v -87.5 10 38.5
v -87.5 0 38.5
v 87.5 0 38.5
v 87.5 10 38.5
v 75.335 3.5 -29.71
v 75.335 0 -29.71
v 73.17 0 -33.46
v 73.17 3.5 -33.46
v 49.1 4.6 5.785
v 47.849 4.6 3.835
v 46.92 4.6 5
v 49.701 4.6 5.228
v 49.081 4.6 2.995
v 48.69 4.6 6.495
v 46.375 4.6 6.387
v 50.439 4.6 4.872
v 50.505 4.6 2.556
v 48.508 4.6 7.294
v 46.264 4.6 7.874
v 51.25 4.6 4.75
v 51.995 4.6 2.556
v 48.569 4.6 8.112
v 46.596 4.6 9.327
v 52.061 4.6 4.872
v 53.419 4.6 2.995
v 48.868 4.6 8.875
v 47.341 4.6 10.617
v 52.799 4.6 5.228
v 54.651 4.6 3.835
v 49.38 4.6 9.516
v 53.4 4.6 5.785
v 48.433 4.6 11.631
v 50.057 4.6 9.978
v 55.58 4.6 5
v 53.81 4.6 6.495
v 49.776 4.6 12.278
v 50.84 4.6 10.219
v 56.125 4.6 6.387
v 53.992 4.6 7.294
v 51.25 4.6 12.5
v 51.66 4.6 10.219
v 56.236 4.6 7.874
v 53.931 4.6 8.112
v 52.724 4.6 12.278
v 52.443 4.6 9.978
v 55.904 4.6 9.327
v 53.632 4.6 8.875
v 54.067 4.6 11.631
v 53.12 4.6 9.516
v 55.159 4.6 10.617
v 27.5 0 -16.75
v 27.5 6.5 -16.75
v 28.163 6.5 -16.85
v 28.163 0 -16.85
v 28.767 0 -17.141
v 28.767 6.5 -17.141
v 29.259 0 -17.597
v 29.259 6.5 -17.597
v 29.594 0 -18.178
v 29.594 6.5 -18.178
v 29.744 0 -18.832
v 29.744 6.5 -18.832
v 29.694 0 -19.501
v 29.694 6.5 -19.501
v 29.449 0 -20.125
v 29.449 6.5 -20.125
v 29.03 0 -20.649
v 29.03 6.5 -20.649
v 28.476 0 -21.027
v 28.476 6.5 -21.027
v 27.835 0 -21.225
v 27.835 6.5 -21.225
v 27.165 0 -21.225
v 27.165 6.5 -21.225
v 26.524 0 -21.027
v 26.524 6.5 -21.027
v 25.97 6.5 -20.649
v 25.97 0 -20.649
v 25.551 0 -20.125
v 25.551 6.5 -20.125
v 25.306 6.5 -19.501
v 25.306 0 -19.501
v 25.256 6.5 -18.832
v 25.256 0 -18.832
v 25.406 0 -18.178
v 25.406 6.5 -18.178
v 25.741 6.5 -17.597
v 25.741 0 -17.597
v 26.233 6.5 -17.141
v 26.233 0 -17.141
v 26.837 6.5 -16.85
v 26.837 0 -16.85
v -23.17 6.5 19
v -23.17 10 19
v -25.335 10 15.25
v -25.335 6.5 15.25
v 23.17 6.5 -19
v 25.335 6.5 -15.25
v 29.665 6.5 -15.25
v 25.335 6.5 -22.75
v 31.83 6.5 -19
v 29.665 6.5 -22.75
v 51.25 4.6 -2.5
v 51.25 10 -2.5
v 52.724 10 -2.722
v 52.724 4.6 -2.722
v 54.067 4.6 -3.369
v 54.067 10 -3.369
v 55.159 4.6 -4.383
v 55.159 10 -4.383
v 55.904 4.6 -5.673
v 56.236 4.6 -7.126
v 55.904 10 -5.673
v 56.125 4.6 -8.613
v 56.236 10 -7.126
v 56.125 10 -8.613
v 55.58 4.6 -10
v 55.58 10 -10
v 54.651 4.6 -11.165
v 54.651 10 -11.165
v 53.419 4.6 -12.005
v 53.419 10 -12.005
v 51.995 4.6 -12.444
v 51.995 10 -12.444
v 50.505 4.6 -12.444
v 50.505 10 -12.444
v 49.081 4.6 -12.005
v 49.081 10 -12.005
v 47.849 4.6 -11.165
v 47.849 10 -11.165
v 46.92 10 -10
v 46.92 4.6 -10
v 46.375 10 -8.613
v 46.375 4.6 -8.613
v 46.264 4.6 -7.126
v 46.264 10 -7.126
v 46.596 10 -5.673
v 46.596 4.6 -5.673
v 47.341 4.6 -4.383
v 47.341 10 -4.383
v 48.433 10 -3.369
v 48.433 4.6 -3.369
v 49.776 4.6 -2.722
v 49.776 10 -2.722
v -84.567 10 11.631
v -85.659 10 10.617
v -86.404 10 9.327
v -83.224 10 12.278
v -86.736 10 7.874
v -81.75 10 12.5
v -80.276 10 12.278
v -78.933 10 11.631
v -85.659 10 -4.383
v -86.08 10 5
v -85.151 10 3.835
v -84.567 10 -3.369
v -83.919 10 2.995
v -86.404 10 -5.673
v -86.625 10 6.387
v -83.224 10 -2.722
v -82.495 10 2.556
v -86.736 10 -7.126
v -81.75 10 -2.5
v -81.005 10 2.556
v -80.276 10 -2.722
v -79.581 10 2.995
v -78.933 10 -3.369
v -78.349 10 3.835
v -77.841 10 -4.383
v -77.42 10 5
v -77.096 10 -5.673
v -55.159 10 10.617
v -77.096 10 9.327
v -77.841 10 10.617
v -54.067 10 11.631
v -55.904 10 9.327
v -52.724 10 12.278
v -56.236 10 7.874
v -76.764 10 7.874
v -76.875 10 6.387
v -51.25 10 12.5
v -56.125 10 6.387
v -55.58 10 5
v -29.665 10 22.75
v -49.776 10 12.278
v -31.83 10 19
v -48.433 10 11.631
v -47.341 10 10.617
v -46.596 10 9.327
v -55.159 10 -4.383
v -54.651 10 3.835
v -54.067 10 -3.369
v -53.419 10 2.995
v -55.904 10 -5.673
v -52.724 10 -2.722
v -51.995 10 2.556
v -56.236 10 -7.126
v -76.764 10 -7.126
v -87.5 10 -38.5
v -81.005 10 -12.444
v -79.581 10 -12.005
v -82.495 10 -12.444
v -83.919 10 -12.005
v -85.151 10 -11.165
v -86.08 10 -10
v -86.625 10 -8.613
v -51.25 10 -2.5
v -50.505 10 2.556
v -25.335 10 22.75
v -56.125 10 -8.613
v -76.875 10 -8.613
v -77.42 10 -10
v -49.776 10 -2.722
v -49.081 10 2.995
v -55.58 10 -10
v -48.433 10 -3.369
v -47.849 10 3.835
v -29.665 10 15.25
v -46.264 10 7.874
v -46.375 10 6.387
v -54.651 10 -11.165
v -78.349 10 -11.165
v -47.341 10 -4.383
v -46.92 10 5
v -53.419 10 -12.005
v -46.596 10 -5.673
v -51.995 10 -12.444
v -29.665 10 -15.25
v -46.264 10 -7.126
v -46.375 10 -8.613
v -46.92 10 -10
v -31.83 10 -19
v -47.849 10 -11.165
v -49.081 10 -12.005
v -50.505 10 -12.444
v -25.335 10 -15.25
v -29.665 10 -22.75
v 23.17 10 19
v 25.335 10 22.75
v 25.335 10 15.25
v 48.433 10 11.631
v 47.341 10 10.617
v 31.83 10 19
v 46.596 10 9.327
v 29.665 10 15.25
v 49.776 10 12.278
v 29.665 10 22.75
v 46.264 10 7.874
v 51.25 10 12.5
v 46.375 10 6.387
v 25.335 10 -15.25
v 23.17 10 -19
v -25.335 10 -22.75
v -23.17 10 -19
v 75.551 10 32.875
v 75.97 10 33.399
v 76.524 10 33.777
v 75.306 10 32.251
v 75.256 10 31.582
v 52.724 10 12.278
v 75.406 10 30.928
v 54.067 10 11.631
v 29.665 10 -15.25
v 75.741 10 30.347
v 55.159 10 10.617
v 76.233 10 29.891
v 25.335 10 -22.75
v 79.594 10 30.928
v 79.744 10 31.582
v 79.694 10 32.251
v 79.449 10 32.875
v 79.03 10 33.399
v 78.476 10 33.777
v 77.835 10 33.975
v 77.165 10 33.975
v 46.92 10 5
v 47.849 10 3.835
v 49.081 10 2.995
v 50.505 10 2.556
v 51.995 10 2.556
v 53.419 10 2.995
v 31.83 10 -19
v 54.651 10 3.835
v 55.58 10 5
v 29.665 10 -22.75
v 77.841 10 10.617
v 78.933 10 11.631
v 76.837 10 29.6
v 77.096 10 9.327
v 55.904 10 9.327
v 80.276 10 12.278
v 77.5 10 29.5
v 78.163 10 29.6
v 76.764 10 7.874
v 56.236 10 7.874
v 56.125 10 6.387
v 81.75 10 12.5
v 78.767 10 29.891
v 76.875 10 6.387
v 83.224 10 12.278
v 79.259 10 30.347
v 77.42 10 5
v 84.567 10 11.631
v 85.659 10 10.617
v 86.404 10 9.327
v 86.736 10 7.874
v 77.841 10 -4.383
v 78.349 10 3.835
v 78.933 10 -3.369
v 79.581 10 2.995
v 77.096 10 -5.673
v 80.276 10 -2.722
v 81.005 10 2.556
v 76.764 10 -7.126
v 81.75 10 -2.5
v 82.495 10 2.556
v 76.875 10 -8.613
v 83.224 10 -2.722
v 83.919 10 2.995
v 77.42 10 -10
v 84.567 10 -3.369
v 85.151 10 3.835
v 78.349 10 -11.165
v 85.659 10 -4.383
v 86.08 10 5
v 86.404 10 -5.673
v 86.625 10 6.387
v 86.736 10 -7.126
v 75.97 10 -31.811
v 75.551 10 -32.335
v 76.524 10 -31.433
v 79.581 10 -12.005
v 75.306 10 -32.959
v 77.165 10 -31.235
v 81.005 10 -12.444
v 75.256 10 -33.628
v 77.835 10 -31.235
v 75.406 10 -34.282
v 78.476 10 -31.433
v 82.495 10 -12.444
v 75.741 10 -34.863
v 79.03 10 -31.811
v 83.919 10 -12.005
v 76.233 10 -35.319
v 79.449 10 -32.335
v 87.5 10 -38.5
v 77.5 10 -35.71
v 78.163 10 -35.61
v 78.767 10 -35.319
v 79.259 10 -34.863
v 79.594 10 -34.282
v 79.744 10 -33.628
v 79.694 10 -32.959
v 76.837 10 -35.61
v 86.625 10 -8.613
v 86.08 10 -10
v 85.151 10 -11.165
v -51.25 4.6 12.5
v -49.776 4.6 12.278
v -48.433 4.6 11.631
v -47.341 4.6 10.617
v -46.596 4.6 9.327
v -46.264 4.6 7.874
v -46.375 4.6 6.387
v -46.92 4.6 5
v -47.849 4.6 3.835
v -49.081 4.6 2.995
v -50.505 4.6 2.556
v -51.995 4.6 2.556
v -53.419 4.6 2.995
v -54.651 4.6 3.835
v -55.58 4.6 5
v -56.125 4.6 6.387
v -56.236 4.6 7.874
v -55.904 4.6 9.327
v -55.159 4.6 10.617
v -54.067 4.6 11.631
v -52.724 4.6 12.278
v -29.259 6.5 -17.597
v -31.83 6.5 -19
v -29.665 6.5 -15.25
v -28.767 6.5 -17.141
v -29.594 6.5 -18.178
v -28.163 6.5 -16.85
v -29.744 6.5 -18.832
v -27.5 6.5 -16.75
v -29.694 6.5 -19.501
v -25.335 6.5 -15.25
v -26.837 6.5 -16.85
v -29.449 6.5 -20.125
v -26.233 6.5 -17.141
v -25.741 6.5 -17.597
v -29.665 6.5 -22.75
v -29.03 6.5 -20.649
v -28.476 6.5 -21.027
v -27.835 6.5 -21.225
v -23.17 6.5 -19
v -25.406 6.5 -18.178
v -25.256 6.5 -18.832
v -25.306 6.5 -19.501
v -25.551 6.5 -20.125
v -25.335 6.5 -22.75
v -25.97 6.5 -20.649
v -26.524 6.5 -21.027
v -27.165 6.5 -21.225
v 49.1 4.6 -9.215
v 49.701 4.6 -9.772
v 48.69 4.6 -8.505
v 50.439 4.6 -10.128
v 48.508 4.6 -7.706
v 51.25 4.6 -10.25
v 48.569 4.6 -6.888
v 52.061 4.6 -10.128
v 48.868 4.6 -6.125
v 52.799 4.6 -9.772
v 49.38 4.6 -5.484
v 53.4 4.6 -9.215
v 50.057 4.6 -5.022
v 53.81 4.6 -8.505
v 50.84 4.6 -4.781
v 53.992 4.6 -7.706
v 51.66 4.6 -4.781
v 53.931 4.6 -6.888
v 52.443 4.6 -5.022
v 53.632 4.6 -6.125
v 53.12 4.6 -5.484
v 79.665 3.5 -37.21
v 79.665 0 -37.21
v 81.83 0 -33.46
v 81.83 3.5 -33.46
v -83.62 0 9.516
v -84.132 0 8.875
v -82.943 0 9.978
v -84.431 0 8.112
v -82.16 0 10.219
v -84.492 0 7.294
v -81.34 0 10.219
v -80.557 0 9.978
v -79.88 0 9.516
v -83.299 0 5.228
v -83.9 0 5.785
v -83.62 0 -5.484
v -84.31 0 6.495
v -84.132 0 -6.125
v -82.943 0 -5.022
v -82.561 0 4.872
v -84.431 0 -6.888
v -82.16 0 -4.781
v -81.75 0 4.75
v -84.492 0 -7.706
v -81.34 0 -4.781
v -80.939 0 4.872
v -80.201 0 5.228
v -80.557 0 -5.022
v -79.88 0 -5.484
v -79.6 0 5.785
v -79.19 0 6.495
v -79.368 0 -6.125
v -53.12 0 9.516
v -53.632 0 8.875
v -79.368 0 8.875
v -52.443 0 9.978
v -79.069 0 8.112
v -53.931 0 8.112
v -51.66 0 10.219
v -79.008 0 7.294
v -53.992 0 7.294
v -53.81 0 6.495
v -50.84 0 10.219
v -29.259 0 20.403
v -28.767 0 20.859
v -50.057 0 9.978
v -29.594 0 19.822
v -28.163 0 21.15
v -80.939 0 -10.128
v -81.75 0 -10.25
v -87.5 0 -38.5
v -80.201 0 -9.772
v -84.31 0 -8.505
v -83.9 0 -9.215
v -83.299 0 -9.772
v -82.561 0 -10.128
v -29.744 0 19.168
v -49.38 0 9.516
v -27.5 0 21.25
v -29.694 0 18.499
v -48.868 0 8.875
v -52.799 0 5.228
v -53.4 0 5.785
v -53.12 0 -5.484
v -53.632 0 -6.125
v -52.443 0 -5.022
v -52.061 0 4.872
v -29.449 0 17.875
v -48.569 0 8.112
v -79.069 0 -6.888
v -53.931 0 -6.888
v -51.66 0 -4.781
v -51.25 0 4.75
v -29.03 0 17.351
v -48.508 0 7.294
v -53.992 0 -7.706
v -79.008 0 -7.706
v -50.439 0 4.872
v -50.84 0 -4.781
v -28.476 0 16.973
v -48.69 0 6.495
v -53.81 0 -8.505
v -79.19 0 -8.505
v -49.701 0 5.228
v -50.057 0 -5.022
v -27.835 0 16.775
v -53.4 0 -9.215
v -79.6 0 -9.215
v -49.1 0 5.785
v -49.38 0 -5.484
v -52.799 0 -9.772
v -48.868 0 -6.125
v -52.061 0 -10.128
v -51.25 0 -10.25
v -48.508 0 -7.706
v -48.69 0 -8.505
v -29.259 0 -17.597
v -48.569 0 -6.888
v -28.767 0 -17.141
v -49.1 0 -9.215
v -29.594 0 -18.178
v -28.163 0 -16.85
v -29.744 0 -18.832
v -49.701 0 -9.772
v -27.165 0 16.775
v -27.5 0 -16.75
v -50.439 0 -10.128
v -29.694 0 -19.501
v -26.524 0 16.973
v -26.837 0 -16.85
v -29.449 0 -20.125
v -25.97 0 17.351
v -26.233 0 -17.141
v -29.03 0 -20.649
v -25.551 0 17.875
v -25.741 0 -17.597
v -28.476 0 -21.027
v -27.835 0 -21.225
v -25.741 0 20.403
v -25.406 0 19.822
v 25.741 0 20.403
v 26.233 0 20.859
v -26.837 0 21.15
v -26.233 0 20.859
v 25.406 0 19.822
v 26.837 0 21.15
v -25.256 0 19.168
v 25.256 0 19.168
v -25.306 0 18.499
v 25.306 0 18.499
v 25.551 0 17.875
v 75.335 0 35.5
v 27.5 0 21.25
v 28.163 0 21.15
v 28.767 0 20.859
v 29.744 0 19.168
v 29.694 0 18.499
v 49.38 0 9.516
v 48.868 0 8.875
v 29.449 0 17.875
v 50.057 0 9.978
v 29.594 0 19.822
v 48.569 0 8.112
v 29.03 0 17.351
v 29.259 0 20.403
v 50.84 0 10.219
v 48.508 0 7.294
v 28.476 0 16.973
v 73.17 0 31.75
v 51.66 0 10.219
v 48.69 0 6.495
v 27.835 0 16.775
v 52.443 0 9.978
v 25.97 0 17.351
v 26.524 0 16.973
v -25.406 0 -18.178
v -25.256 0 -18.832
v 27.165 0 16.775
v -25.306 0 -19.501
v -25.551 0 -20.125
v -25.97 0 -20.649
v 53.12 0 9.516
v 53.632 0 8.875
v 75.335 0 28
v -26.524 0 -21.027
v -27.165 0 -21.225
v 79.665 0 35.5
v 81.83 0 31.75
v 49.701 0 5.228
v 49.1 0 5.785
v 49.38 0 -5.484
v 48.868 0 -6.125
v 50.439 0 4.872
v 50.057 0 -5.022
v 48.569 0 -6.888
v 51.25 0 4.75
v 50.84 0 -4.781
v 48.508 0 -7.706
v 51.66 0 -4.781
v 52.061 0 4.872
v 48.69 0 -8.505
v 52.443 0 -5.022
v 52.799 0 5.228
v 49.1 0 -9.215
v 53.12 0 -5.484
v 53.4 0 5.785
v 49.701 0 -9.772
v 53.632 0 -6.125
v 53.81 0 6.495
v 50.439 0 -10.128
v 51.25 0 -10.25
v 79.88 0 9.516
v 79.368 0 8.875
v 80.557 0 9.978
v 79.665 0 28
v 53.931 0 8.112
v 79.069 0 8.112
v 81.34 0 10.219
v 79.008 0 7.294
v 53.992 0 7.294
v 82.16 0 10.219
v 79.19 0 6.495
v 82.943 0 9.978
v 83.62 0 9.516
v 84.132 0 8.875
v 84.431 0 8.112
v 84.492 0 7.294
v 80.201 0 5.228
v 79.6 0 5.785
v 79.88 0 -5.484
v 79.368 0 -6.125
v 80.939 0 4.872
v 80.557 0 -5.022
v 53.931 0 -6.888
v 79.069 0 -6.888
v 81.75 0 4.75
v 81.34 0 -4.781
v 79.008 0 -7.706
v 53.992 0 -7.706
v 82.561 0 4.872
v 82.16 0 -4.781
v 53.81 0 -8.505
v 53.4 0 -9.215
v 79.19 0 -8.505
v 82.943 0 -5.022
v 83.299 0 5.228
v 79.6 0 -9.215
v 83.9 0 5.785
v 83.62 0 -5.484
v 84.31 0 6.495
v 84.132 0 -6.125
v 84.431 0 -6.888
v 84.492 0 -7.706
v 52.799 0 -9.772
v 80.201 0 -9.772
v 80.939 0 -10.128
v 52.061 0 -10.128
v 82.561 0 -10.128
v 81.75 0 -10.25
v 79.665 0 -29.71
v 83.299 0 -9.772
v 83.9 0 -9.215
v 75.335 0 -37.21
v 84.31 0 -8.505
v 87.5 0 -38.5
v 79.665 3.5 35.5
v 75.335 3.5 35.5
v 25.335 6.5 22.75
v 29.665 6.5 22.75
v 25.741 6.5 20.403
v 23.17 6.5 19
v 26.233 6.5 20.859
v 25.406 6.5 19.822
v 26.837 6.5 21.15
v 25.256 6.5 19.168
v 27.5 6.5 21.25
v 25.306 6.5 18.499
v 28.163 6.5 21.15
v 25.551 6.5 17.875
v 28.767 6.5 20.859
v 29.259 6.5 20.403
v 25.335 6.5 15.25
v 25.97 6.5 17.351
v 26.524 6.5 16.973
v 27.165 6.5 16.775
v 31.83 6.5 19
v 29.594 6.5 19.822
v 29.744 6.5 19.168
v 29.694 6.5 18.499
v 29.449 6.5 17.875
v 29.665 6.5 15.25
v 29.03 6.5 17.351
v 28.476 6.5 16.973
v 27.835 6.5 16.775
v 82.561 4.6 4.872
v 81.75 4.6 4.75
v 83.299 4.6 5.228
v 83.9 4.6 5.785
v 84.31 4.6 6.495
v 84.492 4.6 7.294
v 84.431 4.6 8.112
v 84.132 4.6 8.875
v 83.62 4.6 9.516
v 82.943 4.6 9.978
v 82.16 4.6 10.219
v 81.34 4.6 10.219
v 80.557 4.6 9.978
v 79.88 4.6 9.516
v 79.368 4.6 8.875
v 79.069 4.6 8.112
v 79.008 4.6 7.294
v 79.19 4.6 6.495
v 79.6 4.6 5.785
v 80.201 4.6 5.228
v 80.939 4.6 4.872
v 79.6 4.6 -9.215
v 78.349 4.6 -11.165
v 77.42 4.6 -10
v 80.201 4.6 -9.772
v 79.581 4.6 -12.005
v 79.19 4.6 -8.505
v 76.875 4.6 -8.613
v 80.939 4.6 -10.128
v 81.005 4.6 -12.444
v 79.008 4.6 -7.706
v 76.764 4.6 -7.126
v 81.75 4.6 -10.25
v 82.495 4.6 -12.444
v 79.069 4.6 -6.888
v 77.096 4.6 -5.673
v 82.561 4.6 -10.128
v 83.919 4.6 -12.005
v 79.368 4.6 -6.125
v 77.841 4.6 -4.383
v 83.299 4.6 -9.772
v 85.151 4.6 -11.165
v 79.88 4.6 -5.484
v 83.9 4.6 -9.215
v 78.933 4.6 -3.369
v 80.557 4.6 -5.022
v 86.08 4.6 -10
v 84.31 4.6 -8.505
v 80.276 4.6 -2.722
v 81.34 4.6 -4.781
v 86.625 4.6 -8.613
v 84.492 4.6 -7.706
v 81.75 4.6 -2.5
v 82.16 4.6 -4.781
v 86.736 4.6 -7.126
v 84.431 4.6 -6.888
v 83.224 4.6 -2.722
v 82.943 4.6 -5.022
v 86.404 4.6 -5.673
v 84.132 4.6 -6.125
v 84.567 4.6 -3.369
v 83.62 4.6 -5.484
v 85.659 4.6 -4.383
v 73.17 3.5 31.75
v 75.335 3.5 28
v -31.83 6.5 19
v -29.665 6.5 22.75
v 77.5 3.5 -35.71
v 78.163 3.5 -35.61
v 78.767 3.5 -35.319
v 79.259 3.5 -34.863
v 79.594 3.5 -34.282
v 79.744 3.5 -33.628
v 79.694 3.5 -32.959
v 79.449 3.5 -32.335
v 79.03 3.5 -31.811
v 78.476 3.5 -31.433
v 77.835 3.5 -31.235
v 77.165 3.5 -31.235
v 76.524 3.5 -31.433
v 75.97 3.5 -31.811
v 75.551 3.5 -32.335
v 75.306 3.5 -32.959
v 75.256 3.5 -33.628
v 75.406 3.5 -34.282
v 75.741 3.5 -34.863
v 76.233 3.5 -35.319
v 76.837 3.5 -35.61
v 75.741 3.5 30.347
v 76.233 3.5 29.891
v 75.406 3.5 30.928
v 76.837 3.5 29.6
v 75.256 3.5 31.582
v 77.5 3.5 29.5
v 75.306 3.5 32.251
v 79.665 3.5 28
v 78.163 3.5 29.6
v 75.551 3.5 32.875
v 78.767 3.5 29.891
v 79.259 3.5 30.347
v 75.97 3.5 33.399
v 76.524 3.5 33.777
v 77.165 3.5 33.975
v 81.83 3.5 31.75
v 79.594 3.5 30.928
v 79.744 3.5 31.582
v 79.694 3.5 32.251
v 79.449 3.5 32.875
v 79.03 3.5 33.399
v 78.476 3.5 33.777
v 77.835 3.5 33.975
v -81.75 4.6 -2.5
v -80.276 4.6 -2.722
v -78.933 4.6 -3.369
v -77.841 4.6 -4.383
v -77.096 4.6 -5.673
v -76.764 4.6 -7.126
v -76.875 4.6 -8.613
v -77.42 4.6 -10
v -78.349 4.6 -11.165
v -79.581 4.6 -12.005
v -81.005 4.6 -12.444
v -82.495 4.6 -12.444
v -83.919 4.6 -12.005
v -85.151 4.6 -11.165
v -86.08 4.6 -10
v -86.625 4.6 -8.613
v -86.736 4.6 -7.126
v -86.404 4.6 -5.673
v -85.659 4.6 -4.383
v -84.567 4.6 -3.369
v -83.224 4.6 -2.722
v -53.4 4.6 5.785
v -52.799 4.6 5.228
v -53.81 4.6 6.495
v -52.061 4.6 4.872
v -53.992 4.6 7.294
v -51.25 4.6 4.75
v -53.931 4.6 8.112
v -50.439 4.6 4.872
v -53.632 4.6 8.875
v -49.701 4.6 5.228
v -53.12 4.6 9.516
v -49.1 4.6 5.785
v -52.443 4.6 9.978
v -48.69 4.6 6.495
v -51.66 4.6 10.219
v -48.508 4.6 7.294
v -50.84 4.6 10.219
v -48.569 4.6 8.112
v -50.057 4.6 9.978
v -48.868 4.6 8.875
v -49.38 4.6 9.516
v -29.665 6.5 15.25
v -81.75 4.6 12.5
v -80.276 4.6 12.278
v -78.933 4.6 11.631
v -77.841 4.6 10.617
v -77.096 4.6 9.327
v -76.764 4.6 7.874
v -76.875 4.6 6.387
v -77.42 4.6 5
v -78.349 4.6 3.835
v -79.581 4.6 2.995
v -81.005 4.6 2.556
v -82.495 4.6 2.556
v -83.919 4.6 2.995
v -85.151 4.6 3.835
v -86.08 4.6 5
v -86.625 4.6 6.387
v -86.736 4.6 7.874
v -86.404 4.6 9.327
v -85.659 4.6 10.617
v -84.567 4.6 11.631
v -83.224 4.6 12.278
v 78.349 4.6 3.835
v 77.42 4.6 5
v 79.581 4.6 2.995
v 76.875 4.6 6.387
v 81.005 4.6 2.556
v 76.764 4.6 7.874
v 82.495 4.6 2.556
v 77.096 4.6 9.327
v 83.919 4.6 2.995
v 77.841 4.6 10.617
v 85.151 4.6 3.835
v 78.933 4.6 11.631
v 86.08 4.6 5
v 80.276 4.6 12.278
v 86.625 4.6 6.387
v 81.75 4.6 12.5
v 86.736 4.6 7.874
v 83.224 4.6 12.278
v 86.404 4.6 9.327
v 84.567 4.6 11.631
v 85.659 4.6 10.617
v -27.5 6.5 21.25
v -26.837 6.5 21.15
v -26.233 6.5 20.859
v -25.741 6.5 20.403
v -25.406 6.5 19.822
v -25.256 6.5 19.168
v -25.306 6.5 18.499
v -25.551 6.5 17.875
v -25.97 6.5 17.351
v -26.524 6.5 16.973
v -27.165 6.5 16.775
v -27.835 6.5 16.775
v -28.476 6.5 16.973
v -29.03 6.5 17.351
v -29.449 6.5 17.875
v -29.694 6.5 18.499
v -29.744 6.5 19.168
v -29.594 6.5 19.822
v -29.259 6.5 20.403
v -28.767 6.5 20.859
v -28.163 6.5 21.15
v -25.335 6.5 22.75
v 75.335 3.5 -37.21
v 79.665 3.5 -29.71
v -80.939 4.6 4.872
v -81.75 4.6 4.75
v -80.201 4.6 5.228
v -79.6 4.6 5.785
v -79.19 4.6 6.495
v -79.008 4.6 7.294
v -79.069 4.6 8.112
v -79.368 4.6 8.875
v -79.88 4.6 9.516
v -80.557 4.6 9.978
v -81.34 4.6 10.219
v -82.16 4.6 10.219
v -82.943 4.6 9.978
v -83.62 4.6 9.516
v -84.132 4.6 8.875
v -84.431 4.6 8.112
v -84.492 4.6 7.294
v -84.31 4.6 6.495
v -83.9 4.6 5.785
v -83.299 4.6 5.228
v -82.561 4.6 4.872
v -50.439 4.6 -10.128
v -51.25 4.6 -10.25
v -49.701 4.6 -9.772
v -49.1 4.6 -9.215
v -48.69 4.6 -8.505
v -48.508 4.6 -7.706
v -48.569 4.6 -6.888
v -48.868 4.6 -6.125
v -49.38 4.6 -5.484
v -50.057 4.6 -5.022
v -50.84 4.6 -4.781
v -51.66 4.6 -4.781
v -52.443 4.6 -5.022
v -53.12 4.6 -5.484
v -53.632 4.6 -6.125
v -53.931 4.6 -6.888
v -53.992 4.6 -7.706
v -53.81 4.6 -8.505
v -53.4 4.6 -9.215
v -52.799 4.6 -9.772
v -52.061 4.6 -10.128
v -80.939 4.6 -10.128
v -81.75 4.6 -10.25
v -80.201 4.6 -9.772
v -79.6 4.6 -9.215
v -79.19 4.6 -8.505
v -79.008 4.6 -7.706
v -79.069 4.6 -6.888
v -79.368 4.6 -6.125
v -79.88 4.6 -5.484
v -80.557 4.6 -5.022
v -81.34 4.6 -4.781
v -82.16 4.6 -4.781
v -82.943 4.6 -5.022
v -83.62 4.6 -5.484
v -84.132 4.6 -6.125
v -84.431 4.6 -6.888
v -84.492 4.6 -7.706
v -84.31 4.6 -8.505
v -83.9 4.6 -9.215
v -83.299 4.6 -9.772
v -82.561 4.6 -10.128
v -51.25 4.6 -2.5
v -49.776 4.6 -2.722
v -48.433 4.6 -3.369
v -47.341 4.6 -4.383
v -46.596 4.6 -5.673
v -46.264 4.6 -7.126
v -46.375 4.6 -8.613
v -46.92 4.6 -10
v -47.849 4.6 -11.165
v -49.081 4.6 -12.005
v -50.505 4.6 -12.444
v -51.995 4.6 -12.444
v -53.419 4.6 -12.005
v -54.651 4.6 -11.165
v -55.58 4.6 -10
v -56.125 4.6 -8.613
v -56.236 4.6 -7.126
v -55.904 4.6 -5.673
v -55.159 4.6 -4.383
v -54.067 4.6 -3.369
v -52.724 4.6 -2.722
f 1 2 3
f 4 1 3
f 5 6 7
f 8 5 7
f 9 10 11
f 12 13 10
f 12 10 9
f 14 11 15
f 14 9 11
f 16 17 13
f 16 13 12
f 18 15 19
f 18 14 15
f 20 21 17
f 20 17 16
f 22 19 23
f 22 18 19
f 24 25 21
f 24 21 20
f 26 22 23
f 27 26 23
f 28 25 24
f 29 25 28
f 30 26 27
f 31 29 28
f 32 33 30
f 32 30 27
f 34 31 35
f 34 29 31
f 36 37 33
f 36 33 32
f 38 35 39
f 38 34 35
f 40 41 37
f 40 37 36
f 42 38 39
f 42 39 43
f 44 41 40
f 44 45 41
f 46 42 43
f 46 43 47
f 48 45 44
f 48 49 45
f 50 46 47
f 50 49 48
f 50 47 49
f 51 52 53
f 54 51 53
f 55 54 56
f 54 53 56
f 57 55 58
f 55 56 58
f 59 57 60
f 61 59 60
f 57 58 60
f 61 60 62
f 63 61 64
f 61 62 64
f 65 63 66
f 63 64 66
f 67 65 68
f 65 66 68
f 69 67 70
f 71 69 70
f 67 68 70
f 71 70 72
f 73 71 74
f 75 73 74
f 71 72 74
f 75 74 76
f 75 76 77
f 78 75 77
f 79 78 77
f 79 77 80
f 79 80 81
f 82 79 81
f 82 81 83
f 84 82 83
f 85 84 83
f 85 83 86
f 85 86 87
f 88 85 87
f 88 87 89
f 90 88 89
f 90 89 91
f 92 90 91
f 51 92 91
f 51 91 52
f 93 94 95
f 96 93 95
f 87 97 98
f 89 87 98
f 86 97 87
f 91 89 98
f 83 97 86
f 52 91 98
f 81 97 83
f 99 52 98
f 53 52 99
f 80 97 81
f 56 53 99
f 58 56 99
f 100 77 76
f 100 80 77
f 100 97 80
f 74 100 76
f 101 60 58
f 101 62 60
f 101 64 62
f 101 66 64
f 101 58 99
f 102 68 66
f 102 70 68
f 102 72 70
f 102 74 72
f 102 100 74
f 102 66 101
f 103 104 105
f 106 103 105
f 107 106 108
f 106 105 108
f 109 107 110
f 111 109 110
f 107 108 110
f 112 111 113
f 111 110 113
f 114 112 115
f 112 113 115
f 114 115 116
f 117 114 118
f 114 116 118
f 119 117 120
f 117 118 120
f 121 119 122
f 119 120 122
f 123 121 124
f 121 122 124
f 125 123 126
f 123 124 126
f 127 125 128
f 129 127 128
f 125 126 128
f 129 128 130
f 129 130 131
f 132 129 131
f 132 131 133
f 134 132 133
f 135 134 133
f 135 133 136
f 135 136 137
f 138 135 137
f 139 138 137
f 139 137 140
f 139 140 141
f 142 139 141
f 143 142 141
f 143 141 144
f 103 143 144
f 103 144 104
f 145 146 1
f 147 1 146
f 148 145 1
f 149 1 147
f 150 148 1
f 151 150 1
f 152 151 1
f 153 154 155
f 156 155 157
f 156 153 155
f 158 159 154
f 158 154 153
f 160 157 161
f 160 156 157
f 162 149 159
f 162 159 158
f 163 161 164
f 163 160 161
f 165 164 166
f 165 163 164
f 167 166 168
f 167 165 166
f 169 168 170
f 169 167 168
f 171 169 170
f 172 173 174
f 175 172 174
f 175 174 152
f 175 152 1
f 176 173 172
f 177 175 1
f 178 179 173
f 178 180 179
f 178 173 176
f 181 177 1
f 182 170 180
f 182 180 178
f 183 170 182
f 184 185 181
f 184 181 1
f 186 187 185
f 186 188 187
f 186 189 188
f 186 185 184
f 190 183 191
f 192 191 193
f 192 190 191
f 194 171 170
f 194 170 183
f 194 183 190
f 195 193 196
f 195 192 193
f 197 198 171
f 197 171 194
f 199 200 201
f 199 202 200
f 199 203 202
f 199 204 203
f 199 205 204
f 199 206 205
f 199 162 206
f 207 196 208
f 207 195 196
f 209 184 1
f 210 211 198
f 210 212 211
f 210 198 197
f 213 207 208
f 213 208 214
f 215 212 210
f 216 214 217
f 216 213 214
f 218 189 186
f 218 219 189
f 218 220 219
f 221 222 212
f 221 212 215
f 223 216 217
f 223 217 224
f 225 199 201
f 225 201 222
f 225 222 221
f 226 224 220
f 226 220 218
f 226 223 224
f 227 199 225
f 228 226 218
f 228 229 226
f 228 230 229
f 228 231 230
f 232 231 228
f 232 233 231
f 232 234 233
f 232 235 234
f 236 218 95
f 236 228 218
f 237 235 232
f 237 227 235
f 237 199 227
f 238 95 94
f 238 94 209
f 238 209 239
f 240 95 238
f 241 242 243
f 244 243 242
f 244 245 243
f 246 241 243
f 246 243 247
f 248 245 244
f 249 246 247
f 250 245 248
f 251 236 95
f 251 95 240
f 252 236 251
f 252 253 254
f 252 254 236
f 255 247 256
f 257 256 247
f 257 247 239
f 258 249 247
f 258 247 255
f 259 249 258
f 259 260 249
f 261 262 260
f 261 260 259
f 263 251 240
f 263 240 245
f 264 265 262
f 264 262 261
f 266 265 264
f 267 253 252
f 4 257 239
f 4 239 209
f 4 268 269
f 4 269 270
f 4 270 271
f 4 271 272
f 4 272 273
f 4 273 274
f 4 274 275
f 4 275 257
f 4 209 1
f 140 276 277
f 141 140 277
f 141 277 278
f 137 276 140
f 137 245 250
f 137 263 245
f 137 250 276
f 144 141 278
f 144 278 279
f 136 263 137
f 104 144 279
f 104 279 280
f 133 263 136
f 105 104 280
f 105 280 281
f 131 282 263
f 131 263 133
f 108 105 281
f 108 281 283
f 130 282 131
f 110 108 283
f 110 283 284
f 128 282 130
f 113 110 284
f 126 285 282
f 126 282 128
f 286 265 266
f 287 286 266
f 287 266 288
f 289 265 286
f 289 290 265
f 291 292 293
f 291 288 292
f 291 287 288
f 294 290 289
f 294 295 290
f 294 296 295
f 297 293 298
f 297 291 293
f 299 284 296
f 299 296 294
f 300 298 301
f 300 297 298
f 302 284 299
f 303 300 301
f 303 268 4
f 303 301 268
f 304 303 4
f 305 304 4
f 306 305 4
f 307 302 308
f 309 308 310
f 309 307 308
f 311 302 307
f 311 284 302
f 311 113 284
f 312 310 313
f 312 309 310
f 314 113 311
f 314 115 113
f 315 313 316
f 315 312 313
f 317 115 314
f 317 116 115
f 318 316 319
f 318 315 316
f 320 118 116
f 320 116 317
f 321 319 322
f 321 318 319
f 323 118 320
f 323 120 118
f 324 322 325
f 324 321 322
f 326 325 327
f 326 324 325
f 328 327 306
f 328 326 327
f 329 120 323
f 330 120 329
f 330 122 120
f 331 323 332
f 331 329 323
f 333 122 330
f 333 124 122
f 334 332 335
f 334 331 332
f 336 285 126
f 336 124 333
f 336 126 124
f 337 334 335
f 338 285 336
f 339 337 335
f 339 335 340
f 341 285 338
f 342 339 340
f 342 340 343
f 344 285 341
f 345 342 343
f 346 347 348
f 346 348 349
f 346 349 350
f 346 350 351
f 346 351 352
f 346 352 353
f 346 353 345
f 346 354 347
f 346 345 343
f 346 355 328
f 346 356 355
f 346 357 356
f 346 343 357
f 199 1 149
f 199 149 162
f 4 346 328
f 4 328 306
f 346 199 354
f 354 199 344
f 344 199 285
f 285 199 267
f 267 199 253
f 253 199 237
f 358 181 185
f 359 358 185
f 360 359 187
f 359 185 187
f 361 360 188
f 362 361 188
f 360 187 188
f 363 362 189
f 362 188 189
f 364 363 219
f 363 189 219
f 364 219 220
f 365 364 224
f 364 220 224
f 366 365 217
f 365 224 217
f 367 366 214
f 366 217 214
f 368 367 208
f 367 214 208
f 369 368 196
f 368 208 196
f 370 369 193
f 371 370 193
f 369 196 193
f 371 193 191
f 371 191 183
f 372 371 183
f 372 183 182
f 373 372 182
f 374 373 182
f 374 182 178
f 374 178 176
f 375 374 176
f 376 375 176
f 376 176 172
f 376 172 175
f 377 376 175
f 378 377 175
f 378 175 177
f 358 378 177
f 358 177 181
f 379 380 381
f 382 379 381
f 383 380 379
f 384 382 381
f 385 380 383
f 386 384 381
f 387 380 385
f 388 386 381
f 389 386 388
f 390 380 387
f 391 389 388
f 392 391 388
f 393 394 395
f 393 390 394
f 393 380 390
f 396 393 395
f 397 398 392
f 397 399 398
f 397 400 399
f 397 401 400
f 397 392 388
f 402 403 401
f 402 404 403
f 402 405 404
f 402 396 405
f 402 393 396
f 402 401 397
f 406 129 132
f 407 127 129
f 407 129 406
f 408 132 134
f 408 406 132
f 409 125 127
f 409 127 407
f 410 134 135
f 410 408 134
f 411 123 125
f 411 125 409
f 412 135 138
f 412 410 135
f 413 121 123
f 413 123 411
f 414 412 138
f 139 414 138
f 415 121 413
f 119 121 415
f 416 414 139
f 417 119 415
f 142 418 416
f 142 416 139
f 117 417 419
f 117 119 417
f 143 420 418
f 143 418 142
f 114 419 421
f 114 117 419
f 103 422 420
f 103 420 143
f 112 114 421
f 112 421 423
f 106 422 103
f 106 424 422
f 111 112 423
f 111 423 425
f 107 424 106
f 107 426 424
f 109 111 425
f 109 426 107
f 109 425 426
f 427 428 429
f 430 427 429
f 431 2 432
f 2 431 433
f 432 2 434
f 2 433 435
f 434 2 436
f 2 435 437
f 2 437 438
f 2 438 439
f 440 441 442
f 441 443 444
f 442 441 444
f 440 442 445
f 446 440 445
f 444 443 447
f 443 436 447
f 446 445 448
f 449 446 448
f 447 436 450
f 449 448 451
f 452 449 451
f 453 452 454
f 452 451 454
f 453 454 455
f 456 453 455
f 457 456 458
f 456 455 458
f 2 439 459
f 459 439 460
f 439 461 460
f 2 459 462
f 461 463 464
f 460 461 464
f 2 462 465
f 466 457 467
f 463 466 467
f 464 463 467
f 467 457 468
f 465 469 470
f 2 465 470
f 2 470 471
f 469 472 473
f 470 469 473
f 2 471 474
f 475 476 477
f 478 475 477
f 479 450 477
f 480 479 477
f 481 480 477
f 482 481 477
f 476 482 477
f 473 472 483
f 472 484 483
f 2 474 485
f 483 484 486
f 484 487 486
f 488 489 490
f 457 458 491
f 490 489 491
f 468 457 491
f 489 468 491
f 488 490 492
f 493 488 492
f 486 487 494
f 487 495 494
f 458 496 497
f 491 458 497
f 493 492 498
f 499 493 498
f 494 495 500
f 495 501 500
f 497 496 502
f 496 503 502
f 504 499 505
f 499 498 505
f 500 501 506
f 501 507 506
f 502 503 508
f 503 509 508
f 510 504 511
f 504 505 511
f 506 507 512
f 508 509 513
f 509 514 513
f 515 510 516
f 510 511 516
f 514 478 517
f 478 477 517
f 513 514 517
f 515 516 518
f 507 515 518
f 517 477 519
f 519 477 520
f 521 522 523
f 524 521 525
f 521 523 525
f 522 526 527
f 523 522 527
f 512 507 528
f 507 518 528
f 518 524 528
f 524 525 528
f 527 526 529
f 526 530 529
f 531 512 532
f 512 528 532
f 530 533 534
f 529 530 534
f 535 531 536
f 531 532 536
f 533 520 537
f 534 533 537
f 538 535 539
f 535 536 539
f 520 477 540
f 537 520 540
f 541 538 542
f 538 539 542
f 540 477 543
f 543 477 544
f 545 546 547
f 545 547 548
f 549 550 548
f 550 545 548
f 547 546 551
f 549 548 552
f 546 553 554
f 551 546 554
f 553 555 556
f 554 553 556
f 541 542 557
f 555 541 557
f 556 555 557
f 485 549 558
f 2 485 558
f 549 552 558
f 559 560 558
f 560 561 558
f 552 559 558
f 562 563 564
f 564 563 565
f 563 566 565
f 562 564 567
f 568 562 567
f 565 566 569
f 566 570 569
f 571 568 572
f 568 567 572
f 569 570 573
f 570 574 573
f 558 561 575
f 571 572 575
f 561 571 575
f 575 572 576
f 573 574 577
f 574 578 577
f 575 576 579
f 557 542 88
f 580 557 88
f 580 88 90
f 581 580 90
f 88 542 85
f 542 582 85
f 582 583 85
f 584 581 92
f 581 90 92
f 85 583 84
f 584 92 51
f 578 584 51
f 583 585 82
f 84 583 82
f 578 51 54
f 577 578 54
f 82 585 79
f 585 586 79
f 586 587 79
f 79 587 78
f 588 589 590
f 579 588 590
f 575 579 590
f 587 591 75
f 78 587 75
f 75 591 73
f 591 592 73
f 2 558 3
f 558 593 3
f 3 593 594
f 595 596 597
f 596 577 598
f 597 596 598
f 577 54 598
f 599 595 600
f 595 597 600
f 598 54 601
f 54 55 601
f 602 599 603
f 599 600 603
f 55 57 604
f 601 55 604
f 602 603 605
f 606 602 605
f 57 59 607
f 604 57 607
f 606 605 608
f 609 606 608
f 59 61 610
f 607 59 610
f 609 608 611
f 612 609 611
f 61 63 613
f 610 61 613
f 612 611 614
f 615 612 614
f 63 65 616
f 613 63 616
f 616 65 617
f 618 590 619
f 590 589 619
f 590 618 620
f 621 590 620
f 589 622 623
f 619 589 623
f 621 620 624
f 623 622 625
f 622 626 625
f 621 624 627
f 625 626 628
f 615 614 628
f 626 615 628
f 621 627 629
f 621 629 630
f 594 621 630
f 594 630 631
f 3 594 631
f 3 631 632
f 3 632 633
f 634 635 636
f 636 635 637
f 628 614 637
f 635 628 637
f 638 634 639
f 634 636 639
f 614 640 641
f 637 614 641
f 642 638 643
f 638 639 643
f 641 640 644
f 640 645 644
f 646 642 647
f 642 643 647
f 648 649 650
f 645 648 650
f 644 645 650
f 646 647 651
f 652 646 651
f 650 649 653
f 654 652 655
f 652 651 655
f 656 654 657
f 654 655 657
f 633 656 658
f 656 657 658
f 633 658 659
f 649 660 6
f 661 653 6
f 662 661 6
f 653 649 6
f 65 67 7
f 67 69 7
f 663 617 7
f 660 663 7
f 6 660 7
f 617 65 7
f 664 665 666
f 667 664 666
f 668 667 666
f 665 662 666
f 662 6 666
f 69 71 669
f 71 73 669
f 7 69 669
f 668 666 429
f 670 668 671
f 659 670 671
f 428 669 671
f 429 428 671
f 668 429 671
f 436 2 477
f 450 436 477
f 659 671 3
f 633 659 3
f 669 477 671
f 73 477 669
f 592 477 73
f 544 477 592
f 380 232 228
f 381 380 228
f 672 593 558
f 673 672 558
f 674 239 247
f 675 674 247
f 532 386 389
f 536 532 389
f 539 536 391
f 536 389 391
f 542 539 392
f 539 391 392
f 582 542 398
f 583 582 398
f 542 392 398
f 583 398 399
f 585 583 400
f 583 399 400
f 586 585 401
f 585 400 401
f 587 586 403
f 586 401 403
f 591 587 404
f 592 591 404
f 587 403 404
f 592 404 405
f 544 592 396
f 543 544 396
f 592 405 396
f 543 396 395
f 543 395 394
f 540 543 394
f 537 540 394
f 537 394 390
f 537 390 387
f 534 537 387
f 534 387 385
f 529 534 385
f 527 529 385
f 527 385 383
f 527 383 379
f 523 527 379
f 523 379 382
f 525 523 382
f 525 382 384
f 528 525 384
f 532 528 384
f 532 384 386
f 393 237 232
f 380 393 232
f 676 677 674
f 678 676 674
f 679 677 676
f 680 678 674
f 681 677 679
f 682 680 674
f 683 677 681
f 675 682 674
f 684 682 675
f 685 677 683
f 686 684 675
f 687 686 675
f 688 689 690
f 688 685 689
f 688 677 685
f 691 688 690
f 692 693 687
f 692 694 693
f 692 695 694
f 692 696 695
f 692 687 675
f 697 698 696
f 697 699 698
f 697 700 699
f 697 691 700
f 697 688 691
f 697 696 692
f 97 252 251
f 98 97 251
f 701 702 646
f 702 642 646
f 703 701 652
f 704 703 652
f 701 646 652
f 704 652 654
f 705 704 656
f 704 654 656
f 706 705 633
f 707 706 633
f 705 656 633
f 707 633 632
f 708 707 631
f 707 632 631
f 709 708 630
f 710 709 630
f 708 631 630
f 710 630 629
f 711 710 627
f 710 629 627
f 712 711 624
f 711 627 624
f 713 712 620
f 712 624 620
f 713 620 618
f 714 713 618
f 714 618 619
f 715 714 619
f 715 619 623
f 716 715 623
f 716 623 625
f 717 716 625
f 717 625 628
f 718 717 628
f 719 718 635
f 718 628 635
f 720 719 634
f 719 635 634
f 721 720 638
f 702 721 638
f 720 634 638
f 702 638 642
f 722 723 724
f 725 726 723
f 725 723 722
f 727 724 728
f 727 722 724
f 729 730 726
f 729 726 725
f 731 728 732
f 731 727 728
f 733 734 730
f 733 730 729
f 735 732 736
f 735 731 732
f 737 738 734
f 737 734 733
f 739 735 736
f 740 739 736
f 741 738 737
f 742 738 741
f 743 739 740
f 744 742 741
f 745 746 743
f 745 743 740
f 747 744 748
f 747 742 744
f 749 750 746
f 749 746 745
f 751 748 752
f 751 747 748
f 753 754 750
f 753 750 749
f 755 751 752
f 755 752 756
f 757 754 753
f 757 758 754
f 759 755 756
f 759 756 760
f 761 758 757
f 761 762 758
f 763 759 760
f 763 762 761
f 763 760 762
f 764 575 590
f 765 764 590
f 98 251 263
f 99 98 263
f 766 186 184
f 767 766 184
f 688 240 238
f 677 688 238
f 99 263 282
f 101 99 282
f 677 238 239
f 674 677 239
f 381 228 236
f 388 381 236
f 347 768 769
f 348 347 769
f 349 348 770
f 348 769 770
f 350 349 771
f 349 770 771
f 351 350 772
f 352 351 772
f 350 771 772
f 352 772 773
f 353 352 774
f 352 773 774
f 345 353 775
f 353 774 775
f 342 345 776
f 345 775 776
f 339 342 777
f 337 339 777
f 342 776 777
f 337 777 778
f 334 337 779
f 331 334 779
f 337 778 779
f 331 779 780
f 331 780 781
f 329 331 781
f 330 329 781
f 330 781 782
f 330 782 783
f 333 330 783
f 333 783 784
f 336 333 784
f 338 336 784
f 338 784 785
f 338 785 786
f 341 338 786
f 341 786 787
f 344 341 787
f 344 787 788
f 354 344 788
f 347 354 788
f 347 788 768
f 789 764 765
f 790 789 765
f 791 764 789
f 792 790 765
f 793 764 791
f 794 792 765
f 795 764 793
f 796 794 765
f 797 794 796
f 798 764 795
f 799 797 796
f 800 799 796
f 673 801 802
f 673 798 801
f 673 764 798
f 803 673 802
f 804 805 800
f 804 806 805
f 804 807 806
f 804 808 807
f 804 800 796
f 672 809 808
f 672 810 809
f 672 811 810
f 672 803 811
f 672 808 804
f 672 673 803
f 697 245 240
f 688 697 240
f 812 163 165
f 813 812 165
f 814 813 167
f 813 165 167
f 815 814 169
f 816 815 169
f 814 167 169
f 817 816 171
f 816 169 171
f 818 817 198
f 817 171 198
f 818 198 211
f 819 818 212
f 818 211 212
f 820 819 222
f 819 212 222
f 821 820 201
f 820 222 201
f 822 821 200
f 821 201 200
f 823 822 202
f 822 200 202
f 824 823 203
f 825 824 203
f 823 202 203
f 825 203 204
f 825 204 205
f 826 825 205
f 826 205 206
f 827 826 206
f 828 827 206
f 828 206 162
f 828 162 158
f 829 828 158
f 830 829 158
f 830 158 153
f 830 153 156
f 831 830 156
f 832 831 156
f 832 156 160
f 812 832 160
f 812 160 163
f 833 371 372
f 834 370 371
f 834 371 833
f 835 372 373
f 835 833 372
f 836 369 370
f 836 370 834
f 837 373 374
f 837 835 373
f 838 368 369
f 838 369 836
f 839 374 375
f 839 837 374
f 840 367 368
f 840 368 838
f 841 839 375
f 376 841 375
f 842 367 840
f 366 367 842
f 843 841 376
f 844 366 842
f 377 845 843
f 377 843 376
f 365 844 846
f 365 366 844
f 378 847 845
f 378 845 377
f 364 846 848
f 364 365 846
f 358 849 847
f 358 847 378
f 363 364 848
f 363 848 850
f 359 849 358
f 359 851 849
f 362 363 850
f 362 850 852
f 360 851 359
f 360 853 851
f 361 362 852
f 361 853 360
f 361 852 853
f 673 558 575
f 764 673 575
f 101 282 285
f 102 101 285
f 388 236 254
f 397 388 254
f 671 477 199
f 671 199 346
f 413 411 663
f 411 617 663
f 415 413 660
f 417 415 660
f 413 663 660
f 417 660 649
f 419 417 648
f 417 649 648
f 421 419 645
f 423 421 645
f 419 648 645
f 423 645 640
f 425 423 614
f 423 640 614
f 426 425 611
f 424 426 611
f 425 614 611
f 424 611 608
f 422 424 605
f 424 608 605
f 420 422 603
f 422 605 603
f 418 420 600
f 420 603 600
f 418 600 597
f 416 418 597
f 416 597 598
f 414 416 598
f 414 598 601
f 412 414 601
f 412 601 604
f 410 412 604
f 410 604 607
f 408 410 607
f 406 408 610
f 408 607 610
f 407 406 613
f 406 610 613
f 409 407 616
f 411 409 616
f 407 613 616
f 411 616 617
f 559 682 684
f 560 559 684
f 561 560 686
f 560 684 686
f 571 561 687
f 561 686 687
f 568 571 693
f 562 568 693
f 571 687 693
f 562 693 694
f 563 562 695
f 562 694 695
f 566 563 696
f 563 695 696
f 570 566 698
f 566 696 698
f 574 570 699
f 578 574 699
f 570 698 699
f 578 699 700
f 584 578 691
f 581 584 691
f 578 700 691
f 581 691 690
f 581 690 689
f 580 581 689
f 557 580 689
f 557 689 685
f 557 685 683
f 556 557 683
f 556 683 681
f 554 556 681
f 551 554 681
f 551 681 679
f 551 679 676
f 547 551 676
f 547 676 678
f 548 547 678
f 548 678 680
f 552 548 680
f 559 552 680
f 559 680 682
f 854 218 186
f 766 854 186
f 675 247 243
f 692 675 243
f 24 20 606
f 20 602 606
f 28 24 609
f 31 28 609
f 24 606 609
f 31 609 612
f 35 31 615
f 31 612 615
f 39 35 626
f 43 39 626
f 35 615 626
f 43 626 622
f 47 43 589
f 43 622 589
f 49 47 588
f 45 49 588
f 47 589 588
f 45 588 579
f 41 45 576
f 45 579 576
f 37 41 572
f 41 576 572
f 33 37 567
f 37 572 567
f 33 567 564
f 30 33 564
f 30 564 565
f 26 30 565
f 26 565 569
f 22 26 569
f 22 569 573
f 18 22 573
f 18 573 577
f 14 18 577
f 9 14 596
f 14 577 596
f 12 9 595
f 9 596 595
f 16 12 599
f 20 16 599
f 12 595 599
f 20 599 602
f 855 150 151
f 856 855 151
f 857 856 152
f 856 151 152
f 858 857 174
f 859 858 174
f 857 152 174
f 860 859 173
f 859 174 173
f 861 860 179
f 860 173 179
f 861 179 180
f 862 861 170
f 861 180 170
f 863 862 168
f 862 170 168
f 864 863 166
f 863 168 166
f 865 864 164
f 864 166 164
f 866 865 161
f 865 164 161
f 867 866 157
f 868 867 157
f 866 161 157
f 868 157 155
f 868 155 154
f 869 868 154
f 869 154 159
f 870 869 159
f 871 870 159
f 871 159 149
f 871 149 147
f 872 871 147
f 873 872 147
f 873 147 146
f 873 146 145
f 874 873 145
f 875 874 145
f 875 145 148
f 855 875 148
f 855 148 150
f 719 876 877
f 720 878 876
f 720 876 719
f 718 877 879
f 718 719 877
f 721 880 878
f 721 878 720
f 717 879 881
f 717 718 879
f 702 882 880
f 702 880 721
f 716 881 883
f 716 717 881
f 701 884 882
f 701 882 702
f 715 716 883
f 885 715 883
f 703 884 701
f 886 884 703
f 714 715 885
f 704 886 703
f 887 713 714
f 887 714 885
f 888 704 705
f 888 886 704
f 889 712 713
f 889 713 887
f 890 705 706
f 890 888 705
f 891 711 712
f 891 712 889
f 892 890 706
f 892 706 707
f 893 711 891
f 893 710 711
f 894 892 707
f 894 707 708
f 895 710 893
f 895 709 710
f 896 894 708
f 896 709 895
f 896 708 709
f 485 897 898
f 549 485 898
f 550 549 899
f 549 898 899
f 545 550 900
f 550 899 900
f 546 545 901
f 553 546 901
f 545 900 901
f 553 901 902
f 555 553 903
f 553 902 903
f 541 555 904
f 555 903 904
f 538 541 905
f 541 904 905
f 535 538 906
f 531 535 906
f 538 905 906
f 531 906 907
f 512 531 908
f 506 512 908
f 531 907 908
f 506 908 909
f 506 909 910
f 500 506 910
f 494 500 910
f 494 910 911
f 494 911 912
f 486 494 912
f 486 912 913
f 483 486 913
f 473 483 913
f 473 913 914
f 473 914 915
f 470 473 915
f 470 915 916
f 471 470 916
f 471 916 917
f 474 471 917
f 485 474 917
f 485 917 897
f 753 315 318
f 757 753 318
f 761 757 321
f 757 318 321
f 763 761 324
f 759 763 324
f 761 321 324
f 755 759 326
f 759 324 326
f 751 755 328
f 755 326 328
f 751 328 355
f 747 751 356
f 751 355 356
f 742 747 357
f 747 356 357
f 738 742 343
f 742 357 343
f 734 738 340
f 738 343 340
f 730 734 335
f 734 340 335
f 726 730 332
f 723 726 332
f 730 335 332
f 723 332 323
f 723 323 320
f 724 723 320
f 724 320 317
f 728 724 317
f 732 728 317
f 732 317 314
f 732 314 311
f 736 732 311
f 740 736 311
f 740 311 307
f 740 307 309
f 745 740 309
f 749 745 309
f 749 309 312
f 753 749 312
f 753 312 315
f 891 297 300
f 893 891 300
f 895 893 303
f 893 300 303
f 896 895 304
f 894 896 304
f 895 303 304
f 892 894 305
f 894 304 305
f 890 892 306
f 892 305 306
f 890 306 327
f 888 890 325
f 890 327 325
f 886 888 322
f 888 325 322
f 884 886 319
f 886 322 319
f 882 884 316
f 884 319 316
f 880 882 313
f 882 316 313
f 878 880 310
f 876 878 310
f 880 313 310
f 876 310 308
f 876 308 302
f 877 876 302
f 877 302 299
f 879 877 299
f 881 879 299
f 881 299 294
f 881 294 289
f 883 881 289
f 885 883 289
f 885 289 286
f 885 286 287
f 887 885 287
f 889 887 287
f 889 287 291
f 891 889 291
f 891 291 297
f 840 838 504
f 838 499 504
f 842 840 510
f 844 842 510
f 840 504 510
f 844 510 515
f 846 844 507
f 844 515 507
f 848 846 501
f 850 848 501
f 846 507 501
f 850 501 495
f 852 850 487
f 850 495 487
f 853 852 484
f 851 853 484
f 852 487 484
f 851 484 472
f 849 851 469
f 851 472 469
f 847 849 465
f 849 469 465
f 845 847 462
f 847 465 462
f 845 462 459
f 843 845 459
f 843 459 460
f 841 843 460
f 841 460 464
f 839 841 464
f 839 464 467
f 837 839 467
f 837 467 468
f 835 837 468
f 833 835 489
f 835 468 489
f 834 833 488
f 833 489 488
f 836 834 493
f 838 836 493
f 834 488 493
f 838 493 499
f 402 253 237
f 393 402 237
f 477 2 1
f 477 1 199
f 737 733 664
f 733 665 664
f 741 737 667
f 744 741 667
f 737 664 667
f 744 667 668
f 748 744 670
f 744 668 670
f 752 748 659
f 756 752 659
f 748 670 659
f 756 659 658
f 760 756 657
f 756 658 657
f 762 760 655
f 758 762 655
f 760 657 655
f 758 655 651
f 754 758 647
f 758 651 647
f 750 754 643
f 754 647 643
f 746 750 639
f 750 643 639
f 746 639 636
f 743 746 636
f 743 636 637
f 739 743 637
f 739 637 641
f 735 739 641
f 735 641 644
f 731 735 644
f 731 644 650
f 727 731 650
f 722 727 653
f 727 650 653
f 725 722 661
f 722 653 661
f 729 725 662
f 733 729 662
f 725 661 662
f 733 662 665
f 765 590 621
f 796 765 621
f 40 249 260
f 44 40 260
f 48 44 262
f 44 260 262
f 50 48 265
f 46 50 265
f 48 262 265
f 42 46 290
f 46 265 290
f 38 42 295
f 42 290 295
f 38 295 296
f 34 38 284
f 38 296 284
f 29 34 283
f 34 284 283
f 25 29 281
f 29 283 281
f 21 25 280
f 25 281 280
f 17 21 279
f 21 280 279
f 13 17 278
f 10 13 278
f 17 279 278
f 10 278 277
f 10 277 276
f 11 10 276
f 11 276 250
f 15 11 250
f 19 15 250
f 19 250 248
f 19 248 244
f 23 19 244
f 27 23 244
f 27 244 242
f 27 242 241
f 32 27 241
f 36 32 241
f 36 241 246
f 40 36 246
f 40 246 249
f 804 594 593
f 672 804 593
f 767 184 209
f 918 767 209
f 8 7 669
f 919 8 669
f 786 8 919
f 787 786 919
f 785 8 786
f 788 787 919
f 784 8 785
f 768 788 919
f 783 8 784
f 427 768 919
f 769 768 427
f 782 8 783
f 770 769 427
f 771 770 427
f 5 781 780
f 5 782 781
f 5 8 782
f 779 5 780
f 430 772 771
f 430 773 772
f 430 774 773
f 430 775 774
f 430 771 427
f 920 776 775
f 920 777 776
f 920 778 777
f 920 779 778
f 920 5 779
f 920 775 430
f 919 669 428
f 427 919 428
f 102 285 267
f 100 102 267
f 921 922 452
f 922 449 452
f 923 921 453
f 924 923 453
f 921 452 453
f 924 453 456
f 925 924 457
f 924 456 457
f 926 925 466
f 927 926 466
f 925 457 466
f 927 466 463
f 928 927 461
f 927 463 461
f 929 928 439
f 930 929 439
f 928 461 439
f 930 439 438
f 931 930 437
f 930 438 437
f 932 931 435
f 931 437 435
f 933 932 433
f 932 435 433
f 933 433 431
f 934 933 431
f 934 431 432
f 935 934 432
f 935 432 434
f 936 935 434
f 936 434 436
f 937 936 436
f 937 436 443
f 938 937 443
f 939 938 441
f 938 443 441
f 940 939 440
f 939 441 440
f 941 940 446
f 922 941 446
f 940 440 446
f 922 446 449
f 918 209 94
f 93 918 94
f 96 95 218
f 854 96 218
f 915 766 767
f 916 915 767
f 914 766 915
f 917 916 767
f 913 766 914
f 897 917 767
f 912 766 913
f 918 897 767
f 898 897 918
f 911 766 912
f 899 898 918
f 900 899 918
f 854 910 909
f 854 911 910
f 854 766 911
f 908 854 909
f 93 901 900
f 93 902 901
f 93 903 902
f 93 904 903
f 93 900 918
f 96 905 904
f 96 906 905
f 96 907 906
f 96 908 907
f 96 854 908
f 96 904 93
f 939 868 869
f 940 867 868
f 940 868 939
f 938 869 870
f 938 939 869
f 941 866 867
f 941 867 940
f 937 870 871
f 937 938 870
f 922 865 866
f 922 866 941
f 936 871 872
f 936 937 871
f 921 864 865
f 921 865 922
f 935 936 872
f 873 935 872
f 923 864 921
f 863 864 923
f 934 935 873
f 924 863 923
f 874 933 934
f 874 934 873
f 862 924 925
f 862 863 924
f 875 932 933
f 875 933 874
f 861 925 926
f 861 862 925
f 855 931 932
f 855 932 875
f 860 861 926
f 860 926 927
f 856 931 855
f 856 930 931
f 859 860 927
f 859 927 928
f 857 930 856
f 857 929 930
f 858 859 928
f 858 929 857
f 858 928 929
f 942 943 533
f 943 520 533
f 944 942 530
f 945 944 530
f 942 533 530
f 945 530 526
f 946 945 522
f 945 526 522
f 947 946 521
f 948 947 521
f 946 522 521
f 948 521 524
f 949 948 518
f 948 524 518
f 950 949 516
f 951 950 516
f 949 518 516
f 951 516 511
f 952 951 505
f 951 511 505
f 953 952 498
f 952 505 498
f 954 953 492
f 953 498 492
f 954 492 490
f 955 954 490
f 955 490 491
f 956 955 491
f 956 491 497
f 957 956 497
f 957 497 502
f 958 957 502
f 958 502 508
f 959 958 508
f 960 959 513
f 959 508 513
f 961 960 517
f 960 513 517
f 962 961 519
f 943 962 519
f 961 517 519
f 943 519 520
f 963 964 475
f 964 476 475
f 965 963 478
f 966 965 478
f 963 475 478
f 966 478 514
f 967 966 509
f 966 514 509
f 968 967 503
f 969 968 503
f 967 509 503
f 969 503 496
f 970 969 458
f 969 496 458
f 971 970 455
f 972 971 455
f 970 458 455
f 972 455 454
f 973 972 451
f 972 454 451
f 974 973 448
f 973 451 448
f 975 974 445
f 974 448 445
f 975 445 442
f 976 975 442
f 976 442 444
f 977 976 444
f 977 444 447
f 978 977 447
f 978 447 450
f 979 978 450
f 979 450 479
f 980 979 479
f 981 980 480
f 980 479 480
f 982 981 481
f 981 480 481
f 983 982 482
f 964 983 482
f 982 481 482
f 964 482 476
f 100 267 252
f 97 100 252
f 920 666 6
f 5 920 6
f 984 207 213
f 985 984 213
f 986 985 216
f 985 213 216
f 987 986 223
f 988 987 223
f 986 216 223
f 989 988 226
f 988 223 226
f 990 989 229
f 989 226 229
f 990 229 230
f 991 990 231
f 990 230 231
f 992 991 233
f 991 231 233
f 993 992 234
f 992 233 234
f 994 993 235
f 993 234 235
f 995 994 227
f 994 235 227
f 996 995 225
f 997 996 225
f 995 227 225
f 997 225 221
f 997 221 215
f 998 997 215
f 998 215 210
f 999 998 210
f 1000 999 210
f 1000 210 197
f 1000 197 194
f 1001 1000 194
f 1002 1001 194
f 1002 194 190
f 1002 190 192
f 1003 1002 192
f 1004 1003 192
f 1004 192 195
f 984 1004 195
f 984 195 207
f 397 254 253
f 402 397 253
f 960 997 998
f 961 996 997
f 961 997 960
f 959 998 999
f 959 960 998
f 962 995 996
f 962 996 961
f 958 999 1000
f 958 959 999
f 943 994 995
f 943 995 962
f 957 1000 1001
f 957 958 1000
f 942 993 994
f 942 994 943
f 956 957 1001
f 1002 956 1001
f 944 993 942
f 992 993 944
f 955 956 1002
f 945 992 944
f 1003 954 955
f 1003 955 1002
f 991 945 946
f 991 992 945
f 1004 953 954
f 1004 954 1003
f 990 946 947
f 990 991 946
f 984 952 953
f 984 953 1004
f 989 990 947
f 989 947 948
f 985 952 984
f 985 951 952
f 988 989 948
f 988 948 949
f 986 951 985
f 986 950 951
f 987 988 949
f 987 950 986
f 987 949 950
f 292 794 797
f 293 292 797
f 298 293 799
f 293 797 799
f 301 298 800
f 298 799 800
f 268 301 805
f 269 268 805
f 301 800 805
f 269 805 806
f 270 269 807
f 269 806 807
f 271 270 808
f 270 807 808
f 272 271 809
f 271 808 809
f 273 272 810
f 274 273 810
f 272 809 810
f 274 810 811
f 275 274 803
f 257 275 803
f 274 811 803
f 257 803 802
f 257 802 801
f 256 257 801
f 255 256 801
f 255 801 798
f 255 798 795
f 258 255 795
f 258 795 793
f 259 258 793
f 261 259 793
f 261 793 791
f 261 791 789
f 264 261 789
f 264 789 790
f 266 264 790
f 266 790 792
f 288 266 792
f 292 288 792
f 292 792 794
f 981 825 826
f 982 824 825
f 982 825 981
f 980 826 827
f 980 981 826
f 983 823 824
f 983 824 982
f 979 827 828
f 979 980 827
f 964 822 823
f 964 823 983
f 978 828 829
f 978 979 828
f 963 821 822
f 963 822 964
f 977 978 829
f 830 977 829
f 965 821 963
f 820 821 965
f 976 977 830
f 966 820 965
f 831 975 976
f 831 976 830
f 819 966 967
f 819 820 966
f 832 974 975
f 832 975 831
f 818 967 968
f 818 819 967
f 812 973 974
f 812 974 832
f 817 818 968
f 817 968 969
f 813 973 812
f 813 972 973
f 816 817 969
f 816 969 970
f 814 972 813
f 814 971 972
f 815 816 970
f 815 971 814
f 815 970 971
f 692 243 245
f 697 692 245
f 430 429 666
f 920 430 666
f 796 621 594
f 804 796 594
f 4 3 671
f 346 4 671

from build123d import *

# Parameters (mm, degrees)
SKETCH1_W                                           = 175
SKETCH1_H                                           = 77
BOSS_EXTRUDE1_DEPTH                                 = 10
CBORE_FOR_M5_HEX_SOCKET_HEAD_CAP_SCREW3_D           = 5.5
CBORE_FOR_M5_HEX_SOCKET_HEAD_CAP_SCREW3_CBORE_D     = 10
CBORE_FOR_M5_HEX_SOCKET_HEAD_CAP_SCREW3_CBORE_DEPTH = 5.4
M4_CLEARANCE_HOLE1_D                                = 4.5
CUT_EXTRUDE1_DEPTH                                  = 3.5
M4_CLEARANCE_HOLE2_D                                = 4.5
CUT_EXTRUDE2_DEPTH                                  = 3.5


with BuildPart() as part:
    # Sketch1 → Boss-Extrude1 (new body)
    with BuildSketch(Plane(origin=(0, 0, 0), x_dir=(1, 0, 0), z_dir=(0, 1, 0))):
        Rectangle(SKETCH1_W, SKETCH1_H)
    extrude(amount=BOSS_EXTRUDE1_DEPTH)

    # CBORE for M5 Hex Socket Head Cap Screw3 (through all)
    with Locations(Plane(origin=(-81.75, 10, 7.5), x_dir=(0, 0, 1), z_dir=(0, 1, 0))):
        with Locations((0, 0), (-15, 0), (-15, 30.5), (0, 30.5), (0, 133), (-15, 133), (-15, 163.5), (0, 163.5)):
            CounterBoreHole(CBORE_FOR_M5_HEX_SOCKET_HEAD_CAP_SCREW3_D / 2, CBORE_FOR_M5_HEX_SOCKET_HEAD_CAP_SCREW3_CBORE_D / 2, CBORE_FOR_M5_HEX_SOCKET_HEAD_CAP_SCREW3_CBORE_DEPTH)

    # M4 Clearance Hole1 (through all)
    with Locations(Plane(origin=(77.5, 10, 31.75), x_dir=(0, 0, 1), z_dir=(0, 1, 0))):
        with Locations((0, 0), (-65.21, 0)):
            Hole(M4_CLEARANCE_HOLE1_D / 2)

    # Sketch9 → Cut-Extrude1 (cut)
    with BuildSketch(Plane.XZ):
        Polygon((81.830127019, 31.75), (79.665063509, 35.5), (75.334936491, 35.5), (73.169872981, 31.75), (75.334936491, 28), (79.665063509, 28), align=None)
        Polygon((79.665063509, -29.71), (75.334936491, -29.71), (73.169872981, -33.46), (75.334936491, -37.21), (79.665063509, -37.21), (81.830127019, -33.46), align=None)
    extrude(amount=-CUT_EXTRUDE1_DEPTH, mode=Mode.SUBTRACT)

    # M4 Clearance Hole2 (through all)
    with Locations(Plane(origin=(-27.5, 0, 19), x_dir=(0, 0, -1), z_dir=(0, -1, 0))):
        with Locations((0, 0), (0, 55), (38, 0), (38, 55)):
            Hole(M4_CLEARANCE_HOLE2_D / 2)

    # Sketch12 → Cut-Extrude2 (cut)
    with BuildSketch(Plane(origin=(0, 10, 0), x_dir=(1, 0, 0), z_dir=(0, 1, 0))):
        Polygon((-23.169872981, 19), (-25.334936491, 22.75), (-29.665063509, 22.75), (-31.830127019, 19), (-29.665063509, 15.25), (-25.334936491, 15.25), align=None)
        Polygon((31.830127019, 19), (29.665063509, 22.75), (25.334936491, 22.75), (23.169872981, 19), (25.334936491, 15.25), (29.665063509, 15.25), align=None)
        Polygon((31.830127019, -19), (29.665063509, -15.25), (25.334936491, -15.25), (23.169872981, -19), (25.334936491, -22.75), (29.665063509, -22.75), align=None)
        Polygon((-23.169872981, -19), (-25.334936491, -15.25), (-29.665063509, -15.25), (-31.830127019, -19), (-29.665063509, -22.75), (-25.334936491, -22.75), align=None)
    extrude(amount=-CUT_EXTRUDE2_DEPTH, mode=Mode.SUBTRACT)


solid = part.part
